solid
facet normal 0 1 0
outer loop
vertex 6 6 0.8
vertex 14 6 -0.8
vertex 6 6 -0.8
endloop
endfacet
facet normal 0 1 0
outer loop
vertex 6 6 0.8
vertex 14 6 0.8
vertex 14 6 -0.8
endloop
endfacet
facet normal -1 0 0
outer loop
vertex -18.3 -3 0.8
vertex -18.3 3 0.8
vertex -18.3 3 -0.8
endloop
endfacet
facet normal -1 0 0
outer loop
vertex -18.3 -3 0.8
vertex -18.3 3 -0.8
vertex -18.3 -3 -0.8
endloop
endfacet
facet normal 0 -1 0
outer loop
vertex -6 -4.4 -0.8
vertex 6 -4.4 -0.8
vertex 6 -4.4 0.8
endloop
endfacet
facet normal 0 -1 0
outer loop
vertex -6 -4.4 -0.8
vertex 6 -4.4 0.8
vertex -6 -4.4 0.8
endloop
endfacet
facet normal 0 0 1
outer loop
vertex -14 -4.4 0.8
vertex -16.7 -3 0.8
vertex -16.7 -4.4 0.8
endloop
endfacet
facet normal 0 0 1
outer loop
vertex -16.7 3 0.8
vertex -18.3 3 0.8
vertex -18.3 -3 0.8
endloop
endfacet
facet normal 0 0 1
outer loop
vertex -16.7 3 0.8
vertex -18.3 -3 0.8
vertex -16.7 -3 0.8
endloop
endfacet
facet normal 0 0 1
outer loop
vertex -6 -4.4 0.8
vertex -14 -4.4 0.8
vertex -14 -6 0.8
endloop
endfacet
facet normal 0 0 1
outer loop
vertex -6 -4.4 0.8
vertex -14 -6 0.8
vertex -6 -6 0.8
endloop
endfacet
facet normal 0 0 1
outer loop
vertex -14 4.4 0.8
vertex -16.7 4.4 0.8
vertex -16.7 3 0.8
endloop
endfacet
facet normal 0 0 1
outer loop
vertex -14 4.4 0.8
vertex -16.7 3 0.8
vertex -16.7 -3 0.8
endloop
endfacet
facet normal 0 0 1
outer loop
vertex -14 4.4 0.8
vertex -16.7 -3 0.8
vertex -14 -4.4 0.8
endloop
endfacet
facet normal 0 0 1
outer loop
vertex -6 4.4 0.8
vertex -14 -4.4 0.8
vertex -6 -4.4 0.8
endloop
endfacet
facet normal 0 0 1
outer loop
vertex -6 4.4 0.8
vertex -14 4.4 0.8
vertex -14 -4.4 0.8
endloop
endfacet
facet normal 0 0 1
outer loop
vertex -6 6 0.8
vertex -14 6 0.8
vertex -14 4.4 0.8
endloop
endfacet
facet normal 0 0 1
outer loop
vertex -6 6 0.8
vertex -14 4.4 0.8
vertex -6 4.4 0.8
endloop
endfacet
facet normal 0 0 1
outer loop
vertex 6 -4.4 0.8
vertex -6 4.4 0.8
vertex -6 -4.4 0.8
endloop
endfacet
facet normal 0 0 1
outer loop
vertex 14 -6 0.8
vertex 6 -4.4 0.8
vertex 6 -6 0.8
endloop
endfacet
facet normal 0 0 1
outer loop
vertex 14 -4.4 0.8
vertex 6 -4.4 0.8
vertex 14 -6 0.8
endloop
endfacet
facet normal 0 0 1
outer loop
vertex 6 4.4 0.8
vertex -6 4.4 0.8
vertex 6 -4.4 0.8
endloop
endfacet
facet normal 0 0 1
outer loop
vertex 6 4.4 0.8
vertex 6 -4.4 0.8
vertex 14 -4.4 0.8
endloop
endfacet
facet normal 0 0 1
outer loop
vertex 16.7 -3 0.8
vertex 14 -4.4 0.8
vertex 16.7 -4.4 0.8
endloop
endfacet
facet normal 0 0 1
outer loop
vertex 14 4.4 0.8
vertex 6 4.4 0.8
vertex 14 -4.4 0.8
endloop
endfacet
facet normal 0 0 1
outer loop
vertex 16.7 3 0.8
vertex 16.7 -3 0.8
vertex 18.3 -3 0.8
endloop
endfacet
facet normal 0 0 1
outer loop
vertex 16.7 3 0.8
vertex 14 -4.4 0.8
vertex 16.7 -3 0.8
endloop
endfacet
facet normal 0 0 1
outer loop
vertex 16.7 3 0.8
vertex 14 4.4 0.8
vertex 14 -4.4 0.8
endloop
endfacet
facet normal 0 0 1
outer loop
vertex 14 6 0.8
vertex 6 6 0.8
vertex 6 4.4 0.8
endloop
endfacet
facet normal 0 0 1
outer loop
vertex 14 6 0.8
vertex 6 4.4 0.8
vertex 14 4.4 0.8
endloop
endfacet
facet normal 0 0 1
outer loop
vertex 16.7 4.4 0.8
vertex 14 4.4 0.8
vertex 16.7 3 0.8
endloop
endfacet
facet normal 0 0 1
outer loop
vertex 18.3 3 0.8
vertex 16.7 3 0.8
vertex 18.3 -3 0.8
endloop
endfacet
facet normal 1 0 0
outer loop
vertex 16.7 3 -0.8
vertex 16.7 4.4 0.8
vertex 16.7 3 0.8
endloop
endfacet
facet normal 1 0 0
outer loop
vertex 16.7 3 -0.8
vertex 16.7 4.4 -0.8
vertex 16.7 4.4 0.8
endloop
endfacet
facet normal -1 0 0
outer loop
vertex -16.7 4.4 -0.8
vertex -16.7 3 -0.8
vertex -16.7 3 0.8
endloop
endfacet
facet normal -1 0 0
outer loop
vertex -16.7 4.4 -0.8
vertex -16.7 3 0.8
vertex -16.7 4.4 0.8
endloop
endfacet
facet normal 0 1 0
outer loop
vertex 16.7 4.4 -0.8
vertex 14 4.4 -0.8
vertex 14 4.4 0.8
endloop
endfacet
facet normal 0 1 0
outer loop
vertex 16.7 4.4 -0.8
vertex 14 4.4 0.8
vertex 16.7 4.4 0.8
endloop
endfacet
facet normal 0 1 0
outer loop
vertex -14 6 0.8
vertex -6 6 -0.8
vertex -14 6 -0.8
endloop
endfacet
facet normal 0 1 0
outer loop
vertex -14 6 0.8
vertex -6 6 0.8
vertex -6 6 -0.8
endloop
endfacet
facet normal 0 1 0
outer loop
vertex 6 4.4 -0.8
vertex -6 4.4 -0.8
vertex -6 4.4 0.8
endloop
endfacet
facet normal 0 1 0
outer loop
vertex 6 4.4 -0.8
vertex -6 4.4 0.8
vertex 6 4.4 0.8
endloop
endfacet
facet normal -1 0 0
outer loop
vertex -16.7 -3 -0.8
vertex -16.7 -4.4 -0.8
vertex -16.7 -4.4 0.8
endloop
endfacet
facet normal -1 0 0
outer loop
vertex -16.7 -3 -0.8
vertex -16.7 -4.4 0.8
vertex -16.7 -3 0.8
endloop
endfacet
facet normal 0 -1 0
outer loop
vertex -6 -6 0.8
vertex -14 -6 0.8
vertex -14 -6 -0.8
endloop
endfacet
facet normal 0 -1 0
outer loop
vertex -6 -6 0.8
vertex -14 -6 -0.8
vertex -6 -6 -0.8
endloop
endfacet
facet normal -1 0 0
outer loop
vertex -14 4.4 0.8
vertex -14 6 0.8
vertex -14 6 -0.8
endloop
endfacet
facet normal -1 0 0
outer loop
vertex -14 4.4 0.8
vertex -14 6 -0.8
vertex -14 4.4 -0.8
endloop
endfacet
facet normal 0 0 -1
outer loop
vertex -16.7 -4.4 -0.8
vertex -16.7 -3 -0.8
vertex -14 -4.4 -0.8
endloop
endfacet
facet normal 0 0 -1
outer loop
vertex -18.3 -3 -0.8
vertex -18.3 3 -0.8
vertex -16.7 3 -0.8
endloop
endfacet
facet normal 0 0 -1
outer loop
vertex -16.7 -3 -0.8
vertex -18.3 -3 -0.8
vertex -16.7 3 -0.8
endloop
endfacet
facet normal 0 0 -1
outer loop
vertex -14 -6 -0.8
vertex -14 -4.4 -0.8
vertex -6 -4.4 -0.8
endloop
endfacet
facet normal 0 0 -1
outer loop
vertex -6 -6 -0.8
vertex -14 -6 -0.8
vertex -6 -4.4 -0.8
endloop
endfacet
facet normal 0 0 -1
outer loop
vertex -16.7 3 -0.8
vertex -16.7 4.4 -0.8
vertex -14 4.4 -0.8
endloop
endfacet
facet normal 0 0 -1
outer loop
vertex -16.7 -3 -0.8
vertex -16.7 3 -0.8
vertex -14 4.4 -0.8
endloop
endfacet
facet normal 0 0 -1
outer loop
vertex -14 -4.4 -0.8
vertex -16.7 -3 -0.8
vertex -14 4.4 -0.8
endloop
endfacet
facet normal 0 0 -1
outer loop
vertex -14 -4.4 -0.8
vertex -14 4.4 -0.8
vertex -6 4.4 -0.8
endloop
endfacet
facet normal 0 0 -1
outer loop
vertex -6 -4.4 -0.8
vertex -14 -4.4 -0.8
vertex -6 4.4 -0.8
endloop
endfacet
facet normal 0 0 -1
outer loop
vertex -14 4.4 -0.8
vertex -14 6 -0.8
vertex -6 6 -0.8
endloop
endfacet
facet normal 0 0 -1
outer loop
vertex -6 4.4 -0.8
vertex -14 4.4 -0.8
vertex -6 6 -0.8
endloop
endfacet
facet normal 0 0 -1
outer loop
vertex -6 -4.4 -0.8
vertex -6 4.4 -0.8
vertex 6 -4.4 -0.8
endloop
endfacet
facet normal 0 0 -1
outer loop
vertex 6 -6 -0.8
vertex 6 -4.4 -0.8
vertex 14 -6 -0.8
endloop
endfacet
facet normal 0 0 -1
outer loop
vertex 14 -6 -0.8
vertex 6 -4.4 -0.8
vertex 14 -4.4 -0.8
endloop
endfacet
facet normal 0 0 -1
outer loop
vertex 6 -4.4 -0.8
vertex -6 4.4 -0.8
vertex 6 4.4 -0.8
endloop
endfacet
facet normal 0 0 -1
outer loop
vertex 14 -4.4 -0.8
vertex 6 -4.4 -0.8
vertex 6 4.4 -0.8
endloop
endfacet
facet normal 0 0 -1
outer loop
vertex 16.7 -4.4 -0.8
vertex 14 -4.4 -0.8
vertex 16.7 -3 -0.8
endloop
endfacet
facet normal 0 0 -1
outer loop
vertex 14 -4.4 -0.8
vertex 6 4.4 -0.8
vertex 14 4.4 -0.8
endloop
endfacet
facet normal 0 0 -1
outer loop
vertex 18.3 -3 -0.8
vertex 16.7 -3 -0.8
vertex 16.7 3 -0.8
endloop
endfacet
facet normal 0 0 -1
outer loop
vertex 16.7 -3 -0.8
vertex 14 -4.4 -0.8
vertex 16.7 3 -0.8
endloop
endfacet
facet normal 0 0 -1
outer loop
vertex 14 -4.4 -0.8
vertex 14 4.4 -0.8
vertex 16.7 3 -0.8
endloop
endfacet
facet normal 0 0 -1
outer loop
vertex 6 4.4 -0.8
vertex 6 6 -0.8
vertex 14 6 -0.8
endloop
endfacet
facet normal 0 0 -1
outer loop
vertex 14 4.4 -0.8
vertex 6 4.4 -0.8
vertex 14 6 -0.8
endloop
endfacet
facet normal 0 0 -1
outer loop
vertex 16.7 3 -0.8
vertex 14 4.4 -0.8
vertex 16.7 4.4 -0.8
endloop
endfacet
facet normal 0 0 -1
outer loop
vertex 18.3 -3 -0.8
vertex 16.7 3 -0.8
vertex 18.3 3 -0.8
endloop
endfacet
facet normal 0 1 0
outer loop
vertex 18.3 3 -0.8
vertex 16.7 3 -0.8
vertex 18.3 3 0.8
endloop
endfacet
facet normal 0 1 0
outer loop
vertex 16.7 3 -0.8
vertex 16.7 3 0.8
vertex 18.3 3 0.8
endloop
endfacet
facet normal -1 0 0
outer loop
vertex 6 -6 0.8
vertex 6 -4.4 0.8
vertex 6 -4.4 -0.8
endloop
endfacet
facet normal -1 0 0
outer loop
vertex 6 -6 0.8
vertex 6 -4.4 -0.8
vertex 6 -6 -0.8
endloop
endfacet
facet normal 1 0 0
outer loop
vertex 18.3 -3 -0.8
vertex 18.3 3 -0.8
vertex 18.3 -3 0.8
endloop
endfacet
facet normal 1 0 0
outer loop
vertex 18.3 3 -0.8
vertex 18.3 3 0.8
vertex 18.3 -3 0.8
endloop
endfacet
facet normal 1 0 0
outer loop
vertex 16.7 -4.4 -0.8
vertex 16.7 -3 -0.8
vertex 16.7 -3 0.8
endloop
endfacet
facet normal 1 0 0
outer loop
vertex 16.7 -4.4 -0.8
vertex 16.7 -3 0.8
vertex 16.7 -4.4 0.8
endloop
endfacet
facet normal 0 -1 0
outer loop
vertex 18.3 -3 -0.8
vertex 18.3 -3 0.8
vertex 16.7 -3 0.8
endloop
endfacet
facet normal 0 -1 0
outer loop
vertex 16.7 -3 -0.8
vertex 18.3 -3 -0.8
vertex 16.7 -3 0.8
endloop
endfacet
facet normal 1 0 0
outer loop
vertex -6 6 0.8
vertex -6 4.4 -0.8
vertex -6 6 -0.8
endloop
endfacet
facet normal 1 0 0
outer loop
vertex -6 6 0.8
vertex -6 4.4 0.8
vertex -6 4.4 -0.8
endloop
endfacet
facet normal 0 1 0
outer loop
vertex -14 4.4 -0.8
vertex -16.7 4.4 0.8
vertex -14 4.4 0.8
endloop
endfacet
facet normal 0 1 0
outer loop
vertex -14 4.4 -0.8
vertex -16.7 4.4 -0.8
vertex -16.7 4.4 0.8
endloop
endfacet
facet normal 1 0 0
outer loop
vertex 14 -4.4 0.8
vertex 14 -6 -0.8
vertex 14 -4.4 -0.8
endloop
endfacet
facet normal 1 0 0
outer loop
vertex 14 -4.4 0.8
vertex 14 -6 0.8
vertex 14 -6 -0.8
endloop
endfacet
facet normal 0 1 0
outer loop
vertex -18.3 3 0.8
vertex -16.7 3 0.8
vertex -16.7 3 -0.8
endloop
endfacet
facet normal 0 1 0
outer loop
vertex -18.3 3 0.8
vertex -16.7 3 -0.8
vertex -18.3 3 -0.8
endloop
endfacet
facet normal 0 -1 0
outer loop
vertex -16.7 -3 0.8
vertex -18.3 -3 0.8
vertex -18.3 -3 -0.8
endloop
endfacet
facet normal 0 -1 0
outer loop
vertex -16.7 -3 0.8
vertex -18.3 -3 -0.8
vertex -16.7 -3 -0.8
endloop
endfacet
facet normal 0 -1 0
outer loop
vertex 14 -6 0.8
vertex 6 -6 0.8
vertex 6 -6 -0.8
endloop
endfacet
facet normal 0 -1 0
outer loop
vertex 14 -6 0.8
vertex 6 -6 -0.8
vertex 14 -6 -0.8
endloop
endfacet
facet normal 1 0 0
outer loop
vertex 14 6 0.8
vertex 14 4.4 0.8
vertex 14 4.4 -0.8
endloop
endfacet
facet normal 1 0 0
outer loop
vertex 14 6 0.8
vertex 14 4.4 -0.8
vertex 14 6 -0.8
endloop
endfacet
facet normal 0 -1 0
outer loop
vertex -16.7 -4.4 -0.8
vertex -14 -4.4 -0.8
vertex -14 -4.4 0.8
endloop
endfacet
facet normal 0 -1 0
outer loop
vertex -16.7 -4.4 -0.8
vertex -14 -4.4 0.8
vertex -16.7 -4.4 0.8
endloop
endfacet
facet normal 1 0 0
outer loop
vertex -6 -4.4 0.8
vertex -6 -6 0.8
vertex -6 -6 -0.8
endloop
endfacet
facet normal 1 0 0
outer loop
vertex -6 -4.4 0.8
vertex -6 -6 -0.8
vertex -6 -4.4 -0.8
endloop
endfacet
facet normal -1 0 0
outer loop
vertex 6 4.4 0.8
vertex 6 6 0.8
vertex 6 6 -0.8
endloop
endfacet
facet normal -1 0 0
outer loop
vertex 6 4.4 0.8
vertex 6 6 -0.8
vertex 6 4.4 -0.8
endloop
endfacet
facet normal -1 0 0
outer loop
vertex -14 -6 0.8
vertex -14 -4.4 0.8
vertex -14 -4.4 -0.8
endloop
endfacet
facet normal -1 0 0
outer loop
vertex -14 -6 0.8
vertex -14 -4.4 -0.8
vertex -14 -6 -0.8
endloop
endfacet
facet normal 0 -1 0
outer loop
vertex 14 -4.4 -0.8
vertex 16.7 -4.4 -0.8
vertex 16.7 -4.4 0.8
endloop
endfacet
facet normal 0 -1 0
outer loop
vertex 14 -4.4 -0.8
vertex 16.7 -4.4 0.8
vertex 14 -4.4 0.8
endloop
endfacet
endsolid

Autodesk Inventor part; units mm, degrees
ref_plane "YZ Plane" through (0, 0, 0) normal (1, 0, 0) x (0, 1, 0)
ref_plane "XZ Plane" through (0, 0, 0) normal (0, 1, 0) x (-1, 0, 0)
ref_plane "XY Plane" through (0, 0, 0) normal (0, 0, 1) x (1, 0, 0)
sketch "Sketch1" plane through (0, 0, 0) normal (0, 0, 1) x (1, 0, 0)
  line L0 (0, 6.16) -> (0, -6.16) construction
  line L1 (-23.38, 0) -> (23.38, 0) construction
  line L2 (16.7, -4.4) -> (-16.7, -4.4)
  line L3 (-16.7, -4.4) -> (-16.7, 4.4)
  line L4 (-16.7, 4.4) -> (16.7, 4.4)
  line L5 (16.7, 4.4) -> (16.7, -4.4)
  line L6 (16.7, -4.4) -> (-16.7, 4.4) construction
  line L7 (-16.7, -4.4) -> (16.7, 4.4) construction
  point P0 (0, 0)
  dimension "d0" = 33.4
  dimension "d1" = 8.8
extrude "Extrusion1" add sketch "Sketch1" along normal mid plane 1.6
sketch "Esquisse2" plane through (0, 0, 0.8) normal (0, 0, 1) x (1, 0, 0)
  line L0 (-16.7, -4.4) -> (16.7, -4.4) construction
  line L1 (16.7, -4.4) -> (16.7, 4.4) construction
  line L2 (16.7, 4.4) -> (-16.7, 4.4) construction
  line L3 (-16.7, 4.4) -> (-16.7, -4.4) construction
  line L4 (0, 8.08) -> (0, -6.48) construction
  line L5 (-23.38, 0) -> (23.38, 0) construction
  line L6 (-14, 4.4) -> (-6, 4.4)
  line L7 (-6, 4.4) -> (-6, 6)
  line L8 (-6, 6) -> (-14, 6)
  line L9 (-14, 6) -> (-14, 4.4)
  line L10 (6, 4.4) -> (14, 4.4)
  line L11 (14, 4.4) -> (14, 6)
  line L12 (14, 6) -> (6, 6)
  line L13 (6, 6) -> (6, 4.4)
  point P0 (0, 0)
  dimension "d4" = 8
  dimension "d5" = 1.6
  dimension "d8" = 20
extrude "Extrusion2" add sketch "Esquisse2" against normal blind 1.6
mirror "Symétrie1" about plane through (0, 0, 0) normal (0, 1, 0) of "Extrusion2"
sketch "Esquisse3" plane through (0, 0, 0.8) normal (0, 0, 1) x (1, 0, 0)
  line L0 (-16.7, -4.4) -> (-14, -4.4) construction
  line L1 (-14, -6) -> (-14, -4.4) construction
  line L2 (-6, -6) -> (-14, -6) construction
  line L3 (-6, -4.4) -> (-6, -6) construction
  line L4 (-6, -4.4) -> (6, -4.4) construction
  line L5 (6, -6) -> (6, -4.4) construction
  line L6 (14, -6) -> (6, -6) construction
  line L7 (14, -4.4) -> (14, -6) construction
  line L8 (14, -4.4) -> (16.7, -4.4) construction
  line L9 (16.7, -4.4) -> (16.7, 4.4) construction
  line L10 (16.7, 4.4) -> (14, 4.4) construction
  line L11 (14, 4.4) -> (14, 6) construction
  line L12 (14, 6) -> (6, 6) construction
  line L13 (6, 6) -> (6, 4.4) construction
  line L14 (6, 4.4) -> (-6, 4.4) construction
  line L15 (-6, 4.4) -> (-6, 6) construction
  line L16 (-6, 6) -> (-14, 6) construction
  line L17 (-14, 6) -> (-14, 4.4) construction
  line L18 (-14, 4.4) -> (-16.7, 4.4) construction
  line L19 (-16.7, 4.4) -> (-16.7, -4.4) construction
  line L20 (-23.38, 0) -> (23.38, 0) construction
  line L21 (0, 8.4) -> (0, -8.4) construction
  line L22 (-16.7, 3) -> (-18.3, 3)
  line L23 (-18.3, 3) -> (-18.3, -3)
  line L24 (-18.3, -3) -> (-16.7, -3)
  line L25 (-16.7, -3) -> (-16.7, 3)
  line L26 (16.7, 3) -> (18.3, 3)
  line L27 (18.3, 3) -> (18.3, -3)
  line L28 (18.3, -3) -> (16.7, -3)
  line L29 (16.7, -3) -> (16.7, 3)
  point P0 (0, 0)
  dimension "d15" = 1.6
  dimension "d16" = 6
extrude "Extrusion3" add sketch "Esquisse3" against normal blind 1.6
properties part number "CaissonCoteBiais" material "PVC-U"
